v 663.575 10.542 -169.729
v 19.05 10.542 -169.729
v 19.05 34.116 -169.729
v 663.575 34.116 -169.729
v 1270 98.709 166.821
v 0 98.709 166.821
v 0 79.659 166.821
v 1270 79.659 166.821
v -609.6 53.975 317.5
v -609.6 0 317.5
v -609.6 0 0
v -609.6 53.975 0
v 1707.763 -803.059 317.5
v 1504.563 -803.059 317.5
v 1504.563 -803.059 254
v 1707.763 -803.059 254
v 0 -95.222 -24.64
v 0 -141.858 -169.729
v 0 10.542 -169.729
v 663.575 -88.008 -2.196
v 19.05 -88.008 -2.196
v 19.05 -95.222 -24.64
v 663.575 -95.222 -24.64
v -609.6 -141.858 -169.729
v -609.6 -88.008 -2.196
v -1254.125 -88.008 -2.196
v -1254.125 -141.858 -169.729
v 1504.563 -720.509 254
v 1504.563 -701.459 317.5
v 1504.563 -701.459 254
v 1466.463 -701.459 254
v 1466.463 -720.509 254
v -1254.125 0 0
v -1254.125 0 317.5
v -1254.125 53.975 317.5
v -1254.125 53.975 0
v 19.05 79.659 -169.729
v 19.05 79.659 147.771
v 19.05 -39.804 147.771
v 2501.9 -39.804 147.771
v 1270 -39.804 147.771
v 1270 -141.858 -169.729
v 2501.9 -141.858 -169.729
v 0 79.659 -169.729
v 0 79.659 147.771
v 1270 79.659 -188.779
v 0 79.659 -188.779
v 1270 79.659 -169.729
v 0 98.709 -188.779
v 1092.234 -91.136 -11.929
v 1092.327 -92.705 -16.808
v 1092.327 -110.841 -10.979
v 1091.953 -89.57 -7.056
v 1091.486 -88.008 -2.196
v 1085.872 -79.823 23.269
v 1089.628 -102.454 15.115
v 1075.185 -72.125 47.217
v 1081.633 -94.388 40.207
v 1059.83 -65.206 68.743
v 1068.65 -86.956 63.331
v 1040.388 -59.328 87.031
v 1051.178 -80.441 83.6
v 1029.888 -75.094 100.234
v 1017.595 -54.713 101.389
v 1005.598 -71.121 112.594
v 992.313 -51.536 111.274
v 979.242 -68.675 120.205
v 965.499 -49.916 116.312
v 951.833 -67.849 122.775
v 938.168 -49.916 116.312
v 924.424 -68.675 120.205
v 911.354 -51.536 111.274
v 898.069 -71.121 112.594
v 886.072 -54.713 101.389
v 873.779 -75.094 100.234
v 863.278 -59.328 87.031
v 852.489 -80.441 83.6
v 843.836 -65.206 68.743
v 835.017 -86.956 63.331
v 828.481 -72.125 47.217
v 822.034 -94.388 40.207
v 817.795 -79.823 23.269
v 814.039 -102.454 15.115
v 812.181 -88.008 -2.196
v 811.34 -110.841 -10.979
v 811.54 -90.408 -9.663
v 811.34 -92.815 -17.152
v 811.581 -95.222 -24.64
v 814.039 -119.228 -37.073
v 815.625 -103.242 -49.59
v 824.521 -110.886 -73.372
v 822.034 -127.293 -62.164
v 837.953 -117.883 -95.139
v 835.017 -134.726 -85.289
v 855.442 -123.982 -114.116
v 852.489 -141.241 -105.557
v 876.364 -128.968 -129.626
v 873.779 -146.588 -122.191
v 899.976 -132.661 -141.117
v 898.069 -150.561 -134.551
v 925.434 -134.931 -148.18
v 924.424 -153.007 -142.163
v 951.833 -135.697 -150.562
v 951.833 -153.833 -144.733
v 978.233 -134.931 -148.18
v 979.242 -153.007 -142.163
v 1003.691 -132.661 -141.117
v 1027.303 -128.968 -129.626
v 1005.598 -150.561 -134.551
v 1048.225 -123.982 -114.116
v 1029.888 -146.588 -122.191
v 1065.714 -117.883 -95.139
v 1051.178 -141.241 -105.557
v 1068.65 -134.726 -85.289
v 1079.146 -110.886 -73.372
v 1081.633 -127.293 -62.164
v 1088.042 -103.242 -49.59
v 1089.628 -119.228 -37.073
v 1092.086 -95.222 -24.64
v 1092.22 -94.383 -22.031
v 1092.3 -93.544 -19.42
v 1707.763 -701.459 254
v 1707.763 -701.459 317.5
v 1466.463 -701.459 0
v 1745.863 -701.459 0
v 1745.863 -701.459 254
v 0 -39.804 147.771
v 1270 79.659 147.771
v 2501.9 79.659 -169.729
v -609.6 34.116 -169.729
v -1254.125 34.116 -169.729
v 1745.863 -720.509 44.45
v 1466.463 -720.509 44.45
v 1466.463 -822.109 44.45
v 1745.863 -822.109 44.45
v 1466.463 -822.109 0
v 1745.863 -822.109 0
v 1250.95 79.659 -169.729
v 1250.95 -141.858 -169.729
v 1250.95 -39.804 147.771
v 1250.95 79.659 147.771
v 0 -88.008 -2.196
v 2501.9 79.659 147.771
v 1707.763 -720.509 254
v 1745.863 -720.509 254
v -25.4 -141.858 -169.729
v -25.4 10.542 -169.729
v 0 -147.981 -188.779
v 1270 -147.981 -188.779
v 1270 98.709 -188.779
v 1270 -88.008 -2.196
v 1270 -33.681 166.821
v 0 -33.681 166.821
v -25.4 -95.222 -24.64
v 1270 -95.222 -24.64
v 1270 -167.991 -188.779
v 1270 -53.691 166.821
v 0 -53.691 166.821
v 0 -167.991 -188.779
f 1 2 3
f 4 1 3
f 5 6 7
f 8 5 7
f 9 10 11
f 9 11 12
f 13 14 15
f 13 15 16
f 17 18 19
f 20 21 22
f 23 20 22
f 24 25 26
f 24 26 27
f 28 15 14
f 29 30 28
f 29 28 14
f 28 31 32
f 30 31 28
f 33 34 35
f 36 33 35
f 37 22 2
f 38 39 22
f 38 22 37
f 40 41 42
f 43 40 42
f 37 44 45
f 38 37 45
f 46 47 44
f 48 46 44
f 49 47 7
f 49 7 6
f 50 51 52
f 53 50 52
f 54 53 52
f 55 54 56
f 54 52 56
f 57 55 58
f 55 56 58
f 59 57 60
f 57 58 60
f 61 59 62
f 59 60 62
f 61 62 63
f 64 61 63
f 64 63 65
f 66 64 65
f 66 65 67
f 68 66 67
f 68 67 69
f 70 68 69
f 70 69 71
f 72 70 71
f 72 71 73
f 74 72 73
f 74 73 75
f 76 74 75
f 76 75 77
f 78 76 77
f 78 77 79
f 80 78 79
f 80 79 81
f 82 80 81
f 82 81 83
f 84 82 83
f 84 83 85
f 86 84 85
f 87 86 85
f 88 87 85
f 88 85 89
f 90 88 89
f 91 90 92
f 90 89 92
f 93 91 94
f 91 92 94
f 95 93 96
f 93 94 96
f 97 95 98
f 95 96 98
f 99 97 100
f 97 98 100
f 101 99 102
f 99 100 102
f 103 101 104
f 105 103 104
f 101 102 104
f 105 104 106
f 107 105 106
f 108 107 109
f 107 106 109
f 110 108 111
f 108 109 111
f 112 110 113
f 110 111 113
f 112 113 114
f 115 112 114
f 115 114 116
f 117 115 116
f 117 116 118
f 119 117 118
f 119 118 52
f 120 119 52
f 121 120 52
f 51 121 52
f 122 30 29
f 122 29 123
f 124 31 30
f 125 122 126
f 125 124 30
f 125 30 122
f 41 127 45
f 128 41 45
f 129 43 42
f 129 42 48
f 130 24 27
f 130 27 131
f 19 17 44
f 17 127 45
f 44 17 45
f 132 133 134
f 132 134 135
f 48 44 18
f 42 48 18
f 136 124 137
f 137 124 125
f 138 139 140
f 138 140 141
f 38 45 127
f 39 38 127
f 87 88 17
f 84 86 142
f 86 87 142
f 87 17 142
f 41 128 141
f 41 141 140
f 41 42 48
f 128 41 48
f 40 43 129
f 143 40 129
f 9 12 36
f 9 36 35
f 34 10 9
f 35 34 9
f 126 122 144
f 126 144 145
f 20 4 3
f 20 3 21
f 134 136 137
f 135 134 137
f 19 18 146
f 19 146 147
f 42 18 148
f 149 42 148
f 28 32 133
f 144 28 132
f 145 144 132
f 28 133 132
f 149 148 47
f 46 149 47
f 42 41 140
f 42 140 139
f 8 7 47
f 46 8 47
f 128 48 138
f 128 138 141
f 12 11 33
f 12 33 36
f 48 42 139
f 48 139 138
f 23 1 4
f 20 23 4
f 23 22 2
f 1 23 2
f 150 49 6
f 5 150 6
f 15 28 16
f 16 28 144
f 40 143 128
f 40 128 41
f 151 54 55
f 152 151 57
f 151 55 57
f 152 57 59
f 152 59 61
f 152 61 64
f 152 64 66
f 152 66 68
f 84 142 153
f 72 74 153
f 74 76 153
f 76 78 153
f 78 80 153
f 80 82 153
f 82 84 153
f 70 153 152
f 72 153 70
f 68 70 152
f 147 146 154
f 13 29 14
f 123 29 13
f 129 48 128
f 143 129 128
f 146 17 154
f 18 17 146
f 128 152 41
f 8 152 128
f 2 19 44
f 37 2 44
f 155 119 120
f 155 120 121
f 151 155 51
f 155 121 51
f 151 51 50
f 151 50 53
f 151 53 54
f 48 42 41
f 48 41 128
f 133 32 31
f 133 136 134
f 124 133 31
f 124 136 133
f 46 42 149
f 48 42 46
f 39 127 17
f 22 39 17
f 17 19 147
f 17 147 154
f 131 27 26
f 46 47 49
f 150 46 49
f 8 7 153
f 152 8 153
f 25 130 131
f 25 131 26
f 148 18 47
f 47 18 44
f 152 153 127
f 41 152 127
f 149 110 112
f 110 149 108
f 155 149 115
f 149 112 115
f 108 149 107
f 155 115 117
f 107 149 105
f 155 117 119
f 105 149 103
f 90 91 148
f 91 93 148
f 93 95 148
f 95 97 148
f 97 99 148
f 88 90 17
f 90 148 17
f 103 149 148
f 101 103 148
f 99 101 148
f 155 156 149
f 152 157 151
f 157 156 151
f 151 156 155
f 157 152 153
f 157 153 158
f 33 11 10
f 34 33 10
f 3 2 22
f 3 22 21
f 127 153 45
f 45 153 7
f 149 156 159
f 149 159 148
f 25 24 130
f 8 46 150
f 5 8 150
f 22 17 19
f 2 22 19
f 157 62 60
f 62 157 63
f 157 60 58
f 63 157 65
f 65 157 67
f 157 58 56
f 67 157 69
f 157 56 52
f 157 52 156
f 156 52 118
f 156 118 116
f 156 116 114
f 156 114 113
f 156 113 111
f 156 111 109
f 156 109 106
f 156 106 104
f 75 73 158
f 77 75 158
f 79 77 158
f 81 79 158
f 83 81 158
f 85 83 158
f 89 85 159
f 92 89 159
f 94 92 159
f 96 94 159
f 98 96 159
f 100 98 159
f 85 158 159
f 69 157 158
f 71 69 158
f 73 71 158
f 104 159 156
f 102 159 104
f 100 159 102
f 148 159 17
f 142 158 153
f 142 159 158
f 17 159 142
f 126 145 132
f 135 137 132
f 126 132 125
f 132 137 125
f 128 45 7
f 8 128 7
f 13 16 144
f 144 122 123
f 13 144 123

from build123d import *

# Parameters (mm, degrees)
F1_DEPTH  = 1270
F2_DEPTH  = 1270
F3_DEPTH  = 1270
F4_DEPTH  = 1270
F5_DEPTH  = 663.575
F6_DEPTH  = 19.05
F8_DEPTH  = 19.05
F10_DEPTH = 19.05
F12_DEPTH = 19.05
F14_DEPTH = 1231.9
F17_DEPTH = 644.525
F18_W     = 53.975
F18_H     = 317.5
F19_DEPTH = 644.525
F21_DEPTH = 25.4
F22_R     = 140.49375
F23_DEPTH = 25.4
F25_W     = 279.4
F25_H     = 120.65
F26_DEPTH = 44.45
F27_W     = 279.4
F27_H     = 19.05
F28_DEPTH = 209.55
F30_DEPTH = 63.5
F31_W     = 203.2
F31_H     = 63.5
F32_DEPTH = 82.55
F34_DEPTH = 25.4


with BuildPart() as f1:
    # F0 (on Right) → F1 (new body)
    with BuildSketch(Plane.YZ):
        Polygon((-53.6909185494, 166.8211857855), (-167.9909185494, -188.7788142145), (-147.9810146719, -188.7788142145), (-141.8578003862, -169.7288142145), (-95.2220012912, -24.6396614746), (-88.0080813437, -2.1963549711), (-39.8042289576, 147.7711857855), (-33.6810146719, 166.8211857855), align=None)
    extrude(amount=F1_DEPTH)

    # F22 (on face) → F23 (cut)
    with BuildSketch(Plane(origin=(0, -97.2631433072, 31.2631532059), x_dir=(1, 0, 0), z_dir=(0, -0.9520285613, 0.3060091804))):
        with Locations((951.8334269524, -44.3704833428)):
            Circle(F22_R)
    extrude(amount=-F23_DEPTH, mode=Mode.SUBTRACT)


with BuildPart() as f2:
    # F0 (on Right) → F2 (new body)
    with BuildSketch(Plane.YZ):
        Polygon((79.6590814506, 166.8211857855), (-33.6810146719, 166.8211857855), (-39.8042289576, 147.7711857855), (79.6590814506, 147.7711857855), align=None)
    extrude(amount=F2_DEPTH)


with BuildPart() as f3:
    # F0 (on Right) → F3 (new body)
    with BuildSketch(Plane.YZ):
        Polygon((79.6590814506, -169.7288142145), (79.6590814506, -188.7788142145), (98.7090814506, -188.7788142145), (98.7090814506, 166.8211857855), (79.6590814506, 166.8211857855), (79.6590814506, 147.7711857855), align=None)
    extrude(amount=F3_DEPTH)


with BuildPart() as f4:
    # F0 (on Right) → F4 (new body)
    with BuildSketch(Plane.YZ):
        Polygon((-141.8578003862, -169.7288142145), (-147.9810146719, -188.7788142145), (79.6590814506, -188.7788142145), (79.6590814506, -169.7288142145), (34.1163941456, -169.7288142145), (10.5421996138, -169.7288142145), align=None)
    extrude(amount=F4_DEPTH)


with BuildPart() as f5:
    # F0 (on Right) → F5 (new body)
    with BuildSketch(Plane.YZ):
        Polygon((-88.0080813437, -2.1963549711), (-95.2220012912, -24.6396614746), (10.5421996138, -169.7288142145), (34.1163941456, -169.7288142145), align=None)
    extrude(amount=F5_DEPTH)

    # F0 (on Right) → F8 (cut)
    with BuildSketch(Plane.YZ):
        Polygon((-88.0080813437, -2.1963549711), (-95.2220012912, -24.6396614746), (10.5421996138, -169.7288142145), (34.1163941456, -169.7288142145), align=None)
    extrude(amount=F8_DEPTH, mode=Mode.SUBTRACT)


with BuildPart() as f6:
    # F0 (on Right) → F6 (new body)
    with BuildSketch(Plane.YZ):
        Polygon((34.1163941456, -169.7288142145), (79.6590814506, -169.7288142145), (79.6590814506, 147.7711857855), (-39.8042289576, 147.7711857855), (-88.0080813437, -2.1963549711), align=None)
    extrude(amount=F6_DEPTH)


with BuildPart() as f10:
    # F9 (on face) → F10 (new body)
    with BuildSketch(Plane.YZ):
        Polygon((79.6590814506, -169.7288142145), (79.6590814506, 147.7711857855), (-39.8042289576, 147.7711857855), (-95.2220012912, -24.6396614746), (10.5421996138, -169.7288142145), align=None)
    extrude(amount=F10_DEPTH)


with BuildPart() as f12:
    # F11 (on face) → F12 (new body)
    with BuildSketch(Plane.YZ.offset(1270)):
        Polygon((79.6590814506, 147.7711857855), (-39.8042289576, 147.7711857855), (-141.8578003862, -169.7288142145), (79.6590814506, -169.7288142145), align=None)
    extrude(amount=-F12_DEPTH)


with BuildPart() as f14:
    # F13 (on face) → F14 (new body)
    with BuildSketch(Plane.YZ.offset(1270)):
        Polygon((79.6590814506, 147.7711857855), (-39.8042289576, 147.7711857855), (-141.8578003862, -169.7288142145), (79.6590814506, -169.7288142145), align=None)
    extrude(amount=F14_DEPTH)


with BuildPart() as f17:
    # F16 (on offset) → F17 (new body)
    with BuildSketch(Plane.YZ.offset(-609.6)):
        Polygon((34.1163941456, -169.7288142145), (-88.0080813437, -2.1963549711), (-141.8578003862, -169.7288142145), align=None)
    extrude(amount=-F17_DEPTH)


with BuildPart() as f19:
    # F18 (on offset) → F19 (new body)
    with BuildSketch(Plane.YZ.offset(-609.6)):
        with Locations((26.9875, 158.75)):
            Rectangle(F18_W, F18_H)
    extrude(amount=-F19_DEPTH)


with BuildPart() as f21:
    # F0 (on Right) → F21 (new body)
    with BuildSketch(Plane.YZ):
        Polygon((-95.2220012912, -24.6396614746), (-141.8578003862, -169.7288142145), (10.5421996138, -169.7288142145), align=None)
    extrude(amount=-F21_DEPTH)


with BuildPart() as f26:
    # F25 (on Top) → F26 (new body)
    with BuildSketch(Plane.XY):
        with Locations((1606.16296978, -761.7842885971)):
            Rectangle(F25_W, F25_H)
    extrude(amount=F26_DEPTH)

    # F27 (on face) → F28 (join)
    with BuildSketch(Plane.XY.offset(44.45)):
        with Locations((1606.16296978, -710.9842885971)):
            Rectangle(F27_W, F27_H)
    extrude(amount=F28_DEPTH)

    # F29 (on face) → F30 (join)
    with BuildSketch(Plane.XY.offset(254)):
        Polygon((1504.56296978, -720.5092885971), (1606.16296978, -720.5092885971), (1707.76296978, -720.5092885971), (1707.76296978, -701.4592885971), (1504.56296978, -701.4592885971), align=None)
    extrude(amount=F30_DEPTH)

    # F31 (on face) → F32 (join)
    with BuildSketch(Plane.XZ.offset(720.5092885971)):
        with Locations((1606.16296978, 285.75)):
            Rectangle(F31_W, F31_H)
    extrude(amount=F32_DEPTH)


with BuildPart() as f34:
    # F33 (on face) → F34 (new body)
    with BuildSketch(Plane.YZ):
        Polygon((10.5421996138, -169.7288142145), (-95.2220012912, -24.6396614746), (-141.8578003862, -169.7288142145), align=None)
    extrude(amount=-F34_DEPTH)


solid = Compound([f1.part, f2.part, f3.part, f4.part, f5.part, f10.part, f12.part, f14.part, f17.part, f19.part, f26.part, f34.part])
